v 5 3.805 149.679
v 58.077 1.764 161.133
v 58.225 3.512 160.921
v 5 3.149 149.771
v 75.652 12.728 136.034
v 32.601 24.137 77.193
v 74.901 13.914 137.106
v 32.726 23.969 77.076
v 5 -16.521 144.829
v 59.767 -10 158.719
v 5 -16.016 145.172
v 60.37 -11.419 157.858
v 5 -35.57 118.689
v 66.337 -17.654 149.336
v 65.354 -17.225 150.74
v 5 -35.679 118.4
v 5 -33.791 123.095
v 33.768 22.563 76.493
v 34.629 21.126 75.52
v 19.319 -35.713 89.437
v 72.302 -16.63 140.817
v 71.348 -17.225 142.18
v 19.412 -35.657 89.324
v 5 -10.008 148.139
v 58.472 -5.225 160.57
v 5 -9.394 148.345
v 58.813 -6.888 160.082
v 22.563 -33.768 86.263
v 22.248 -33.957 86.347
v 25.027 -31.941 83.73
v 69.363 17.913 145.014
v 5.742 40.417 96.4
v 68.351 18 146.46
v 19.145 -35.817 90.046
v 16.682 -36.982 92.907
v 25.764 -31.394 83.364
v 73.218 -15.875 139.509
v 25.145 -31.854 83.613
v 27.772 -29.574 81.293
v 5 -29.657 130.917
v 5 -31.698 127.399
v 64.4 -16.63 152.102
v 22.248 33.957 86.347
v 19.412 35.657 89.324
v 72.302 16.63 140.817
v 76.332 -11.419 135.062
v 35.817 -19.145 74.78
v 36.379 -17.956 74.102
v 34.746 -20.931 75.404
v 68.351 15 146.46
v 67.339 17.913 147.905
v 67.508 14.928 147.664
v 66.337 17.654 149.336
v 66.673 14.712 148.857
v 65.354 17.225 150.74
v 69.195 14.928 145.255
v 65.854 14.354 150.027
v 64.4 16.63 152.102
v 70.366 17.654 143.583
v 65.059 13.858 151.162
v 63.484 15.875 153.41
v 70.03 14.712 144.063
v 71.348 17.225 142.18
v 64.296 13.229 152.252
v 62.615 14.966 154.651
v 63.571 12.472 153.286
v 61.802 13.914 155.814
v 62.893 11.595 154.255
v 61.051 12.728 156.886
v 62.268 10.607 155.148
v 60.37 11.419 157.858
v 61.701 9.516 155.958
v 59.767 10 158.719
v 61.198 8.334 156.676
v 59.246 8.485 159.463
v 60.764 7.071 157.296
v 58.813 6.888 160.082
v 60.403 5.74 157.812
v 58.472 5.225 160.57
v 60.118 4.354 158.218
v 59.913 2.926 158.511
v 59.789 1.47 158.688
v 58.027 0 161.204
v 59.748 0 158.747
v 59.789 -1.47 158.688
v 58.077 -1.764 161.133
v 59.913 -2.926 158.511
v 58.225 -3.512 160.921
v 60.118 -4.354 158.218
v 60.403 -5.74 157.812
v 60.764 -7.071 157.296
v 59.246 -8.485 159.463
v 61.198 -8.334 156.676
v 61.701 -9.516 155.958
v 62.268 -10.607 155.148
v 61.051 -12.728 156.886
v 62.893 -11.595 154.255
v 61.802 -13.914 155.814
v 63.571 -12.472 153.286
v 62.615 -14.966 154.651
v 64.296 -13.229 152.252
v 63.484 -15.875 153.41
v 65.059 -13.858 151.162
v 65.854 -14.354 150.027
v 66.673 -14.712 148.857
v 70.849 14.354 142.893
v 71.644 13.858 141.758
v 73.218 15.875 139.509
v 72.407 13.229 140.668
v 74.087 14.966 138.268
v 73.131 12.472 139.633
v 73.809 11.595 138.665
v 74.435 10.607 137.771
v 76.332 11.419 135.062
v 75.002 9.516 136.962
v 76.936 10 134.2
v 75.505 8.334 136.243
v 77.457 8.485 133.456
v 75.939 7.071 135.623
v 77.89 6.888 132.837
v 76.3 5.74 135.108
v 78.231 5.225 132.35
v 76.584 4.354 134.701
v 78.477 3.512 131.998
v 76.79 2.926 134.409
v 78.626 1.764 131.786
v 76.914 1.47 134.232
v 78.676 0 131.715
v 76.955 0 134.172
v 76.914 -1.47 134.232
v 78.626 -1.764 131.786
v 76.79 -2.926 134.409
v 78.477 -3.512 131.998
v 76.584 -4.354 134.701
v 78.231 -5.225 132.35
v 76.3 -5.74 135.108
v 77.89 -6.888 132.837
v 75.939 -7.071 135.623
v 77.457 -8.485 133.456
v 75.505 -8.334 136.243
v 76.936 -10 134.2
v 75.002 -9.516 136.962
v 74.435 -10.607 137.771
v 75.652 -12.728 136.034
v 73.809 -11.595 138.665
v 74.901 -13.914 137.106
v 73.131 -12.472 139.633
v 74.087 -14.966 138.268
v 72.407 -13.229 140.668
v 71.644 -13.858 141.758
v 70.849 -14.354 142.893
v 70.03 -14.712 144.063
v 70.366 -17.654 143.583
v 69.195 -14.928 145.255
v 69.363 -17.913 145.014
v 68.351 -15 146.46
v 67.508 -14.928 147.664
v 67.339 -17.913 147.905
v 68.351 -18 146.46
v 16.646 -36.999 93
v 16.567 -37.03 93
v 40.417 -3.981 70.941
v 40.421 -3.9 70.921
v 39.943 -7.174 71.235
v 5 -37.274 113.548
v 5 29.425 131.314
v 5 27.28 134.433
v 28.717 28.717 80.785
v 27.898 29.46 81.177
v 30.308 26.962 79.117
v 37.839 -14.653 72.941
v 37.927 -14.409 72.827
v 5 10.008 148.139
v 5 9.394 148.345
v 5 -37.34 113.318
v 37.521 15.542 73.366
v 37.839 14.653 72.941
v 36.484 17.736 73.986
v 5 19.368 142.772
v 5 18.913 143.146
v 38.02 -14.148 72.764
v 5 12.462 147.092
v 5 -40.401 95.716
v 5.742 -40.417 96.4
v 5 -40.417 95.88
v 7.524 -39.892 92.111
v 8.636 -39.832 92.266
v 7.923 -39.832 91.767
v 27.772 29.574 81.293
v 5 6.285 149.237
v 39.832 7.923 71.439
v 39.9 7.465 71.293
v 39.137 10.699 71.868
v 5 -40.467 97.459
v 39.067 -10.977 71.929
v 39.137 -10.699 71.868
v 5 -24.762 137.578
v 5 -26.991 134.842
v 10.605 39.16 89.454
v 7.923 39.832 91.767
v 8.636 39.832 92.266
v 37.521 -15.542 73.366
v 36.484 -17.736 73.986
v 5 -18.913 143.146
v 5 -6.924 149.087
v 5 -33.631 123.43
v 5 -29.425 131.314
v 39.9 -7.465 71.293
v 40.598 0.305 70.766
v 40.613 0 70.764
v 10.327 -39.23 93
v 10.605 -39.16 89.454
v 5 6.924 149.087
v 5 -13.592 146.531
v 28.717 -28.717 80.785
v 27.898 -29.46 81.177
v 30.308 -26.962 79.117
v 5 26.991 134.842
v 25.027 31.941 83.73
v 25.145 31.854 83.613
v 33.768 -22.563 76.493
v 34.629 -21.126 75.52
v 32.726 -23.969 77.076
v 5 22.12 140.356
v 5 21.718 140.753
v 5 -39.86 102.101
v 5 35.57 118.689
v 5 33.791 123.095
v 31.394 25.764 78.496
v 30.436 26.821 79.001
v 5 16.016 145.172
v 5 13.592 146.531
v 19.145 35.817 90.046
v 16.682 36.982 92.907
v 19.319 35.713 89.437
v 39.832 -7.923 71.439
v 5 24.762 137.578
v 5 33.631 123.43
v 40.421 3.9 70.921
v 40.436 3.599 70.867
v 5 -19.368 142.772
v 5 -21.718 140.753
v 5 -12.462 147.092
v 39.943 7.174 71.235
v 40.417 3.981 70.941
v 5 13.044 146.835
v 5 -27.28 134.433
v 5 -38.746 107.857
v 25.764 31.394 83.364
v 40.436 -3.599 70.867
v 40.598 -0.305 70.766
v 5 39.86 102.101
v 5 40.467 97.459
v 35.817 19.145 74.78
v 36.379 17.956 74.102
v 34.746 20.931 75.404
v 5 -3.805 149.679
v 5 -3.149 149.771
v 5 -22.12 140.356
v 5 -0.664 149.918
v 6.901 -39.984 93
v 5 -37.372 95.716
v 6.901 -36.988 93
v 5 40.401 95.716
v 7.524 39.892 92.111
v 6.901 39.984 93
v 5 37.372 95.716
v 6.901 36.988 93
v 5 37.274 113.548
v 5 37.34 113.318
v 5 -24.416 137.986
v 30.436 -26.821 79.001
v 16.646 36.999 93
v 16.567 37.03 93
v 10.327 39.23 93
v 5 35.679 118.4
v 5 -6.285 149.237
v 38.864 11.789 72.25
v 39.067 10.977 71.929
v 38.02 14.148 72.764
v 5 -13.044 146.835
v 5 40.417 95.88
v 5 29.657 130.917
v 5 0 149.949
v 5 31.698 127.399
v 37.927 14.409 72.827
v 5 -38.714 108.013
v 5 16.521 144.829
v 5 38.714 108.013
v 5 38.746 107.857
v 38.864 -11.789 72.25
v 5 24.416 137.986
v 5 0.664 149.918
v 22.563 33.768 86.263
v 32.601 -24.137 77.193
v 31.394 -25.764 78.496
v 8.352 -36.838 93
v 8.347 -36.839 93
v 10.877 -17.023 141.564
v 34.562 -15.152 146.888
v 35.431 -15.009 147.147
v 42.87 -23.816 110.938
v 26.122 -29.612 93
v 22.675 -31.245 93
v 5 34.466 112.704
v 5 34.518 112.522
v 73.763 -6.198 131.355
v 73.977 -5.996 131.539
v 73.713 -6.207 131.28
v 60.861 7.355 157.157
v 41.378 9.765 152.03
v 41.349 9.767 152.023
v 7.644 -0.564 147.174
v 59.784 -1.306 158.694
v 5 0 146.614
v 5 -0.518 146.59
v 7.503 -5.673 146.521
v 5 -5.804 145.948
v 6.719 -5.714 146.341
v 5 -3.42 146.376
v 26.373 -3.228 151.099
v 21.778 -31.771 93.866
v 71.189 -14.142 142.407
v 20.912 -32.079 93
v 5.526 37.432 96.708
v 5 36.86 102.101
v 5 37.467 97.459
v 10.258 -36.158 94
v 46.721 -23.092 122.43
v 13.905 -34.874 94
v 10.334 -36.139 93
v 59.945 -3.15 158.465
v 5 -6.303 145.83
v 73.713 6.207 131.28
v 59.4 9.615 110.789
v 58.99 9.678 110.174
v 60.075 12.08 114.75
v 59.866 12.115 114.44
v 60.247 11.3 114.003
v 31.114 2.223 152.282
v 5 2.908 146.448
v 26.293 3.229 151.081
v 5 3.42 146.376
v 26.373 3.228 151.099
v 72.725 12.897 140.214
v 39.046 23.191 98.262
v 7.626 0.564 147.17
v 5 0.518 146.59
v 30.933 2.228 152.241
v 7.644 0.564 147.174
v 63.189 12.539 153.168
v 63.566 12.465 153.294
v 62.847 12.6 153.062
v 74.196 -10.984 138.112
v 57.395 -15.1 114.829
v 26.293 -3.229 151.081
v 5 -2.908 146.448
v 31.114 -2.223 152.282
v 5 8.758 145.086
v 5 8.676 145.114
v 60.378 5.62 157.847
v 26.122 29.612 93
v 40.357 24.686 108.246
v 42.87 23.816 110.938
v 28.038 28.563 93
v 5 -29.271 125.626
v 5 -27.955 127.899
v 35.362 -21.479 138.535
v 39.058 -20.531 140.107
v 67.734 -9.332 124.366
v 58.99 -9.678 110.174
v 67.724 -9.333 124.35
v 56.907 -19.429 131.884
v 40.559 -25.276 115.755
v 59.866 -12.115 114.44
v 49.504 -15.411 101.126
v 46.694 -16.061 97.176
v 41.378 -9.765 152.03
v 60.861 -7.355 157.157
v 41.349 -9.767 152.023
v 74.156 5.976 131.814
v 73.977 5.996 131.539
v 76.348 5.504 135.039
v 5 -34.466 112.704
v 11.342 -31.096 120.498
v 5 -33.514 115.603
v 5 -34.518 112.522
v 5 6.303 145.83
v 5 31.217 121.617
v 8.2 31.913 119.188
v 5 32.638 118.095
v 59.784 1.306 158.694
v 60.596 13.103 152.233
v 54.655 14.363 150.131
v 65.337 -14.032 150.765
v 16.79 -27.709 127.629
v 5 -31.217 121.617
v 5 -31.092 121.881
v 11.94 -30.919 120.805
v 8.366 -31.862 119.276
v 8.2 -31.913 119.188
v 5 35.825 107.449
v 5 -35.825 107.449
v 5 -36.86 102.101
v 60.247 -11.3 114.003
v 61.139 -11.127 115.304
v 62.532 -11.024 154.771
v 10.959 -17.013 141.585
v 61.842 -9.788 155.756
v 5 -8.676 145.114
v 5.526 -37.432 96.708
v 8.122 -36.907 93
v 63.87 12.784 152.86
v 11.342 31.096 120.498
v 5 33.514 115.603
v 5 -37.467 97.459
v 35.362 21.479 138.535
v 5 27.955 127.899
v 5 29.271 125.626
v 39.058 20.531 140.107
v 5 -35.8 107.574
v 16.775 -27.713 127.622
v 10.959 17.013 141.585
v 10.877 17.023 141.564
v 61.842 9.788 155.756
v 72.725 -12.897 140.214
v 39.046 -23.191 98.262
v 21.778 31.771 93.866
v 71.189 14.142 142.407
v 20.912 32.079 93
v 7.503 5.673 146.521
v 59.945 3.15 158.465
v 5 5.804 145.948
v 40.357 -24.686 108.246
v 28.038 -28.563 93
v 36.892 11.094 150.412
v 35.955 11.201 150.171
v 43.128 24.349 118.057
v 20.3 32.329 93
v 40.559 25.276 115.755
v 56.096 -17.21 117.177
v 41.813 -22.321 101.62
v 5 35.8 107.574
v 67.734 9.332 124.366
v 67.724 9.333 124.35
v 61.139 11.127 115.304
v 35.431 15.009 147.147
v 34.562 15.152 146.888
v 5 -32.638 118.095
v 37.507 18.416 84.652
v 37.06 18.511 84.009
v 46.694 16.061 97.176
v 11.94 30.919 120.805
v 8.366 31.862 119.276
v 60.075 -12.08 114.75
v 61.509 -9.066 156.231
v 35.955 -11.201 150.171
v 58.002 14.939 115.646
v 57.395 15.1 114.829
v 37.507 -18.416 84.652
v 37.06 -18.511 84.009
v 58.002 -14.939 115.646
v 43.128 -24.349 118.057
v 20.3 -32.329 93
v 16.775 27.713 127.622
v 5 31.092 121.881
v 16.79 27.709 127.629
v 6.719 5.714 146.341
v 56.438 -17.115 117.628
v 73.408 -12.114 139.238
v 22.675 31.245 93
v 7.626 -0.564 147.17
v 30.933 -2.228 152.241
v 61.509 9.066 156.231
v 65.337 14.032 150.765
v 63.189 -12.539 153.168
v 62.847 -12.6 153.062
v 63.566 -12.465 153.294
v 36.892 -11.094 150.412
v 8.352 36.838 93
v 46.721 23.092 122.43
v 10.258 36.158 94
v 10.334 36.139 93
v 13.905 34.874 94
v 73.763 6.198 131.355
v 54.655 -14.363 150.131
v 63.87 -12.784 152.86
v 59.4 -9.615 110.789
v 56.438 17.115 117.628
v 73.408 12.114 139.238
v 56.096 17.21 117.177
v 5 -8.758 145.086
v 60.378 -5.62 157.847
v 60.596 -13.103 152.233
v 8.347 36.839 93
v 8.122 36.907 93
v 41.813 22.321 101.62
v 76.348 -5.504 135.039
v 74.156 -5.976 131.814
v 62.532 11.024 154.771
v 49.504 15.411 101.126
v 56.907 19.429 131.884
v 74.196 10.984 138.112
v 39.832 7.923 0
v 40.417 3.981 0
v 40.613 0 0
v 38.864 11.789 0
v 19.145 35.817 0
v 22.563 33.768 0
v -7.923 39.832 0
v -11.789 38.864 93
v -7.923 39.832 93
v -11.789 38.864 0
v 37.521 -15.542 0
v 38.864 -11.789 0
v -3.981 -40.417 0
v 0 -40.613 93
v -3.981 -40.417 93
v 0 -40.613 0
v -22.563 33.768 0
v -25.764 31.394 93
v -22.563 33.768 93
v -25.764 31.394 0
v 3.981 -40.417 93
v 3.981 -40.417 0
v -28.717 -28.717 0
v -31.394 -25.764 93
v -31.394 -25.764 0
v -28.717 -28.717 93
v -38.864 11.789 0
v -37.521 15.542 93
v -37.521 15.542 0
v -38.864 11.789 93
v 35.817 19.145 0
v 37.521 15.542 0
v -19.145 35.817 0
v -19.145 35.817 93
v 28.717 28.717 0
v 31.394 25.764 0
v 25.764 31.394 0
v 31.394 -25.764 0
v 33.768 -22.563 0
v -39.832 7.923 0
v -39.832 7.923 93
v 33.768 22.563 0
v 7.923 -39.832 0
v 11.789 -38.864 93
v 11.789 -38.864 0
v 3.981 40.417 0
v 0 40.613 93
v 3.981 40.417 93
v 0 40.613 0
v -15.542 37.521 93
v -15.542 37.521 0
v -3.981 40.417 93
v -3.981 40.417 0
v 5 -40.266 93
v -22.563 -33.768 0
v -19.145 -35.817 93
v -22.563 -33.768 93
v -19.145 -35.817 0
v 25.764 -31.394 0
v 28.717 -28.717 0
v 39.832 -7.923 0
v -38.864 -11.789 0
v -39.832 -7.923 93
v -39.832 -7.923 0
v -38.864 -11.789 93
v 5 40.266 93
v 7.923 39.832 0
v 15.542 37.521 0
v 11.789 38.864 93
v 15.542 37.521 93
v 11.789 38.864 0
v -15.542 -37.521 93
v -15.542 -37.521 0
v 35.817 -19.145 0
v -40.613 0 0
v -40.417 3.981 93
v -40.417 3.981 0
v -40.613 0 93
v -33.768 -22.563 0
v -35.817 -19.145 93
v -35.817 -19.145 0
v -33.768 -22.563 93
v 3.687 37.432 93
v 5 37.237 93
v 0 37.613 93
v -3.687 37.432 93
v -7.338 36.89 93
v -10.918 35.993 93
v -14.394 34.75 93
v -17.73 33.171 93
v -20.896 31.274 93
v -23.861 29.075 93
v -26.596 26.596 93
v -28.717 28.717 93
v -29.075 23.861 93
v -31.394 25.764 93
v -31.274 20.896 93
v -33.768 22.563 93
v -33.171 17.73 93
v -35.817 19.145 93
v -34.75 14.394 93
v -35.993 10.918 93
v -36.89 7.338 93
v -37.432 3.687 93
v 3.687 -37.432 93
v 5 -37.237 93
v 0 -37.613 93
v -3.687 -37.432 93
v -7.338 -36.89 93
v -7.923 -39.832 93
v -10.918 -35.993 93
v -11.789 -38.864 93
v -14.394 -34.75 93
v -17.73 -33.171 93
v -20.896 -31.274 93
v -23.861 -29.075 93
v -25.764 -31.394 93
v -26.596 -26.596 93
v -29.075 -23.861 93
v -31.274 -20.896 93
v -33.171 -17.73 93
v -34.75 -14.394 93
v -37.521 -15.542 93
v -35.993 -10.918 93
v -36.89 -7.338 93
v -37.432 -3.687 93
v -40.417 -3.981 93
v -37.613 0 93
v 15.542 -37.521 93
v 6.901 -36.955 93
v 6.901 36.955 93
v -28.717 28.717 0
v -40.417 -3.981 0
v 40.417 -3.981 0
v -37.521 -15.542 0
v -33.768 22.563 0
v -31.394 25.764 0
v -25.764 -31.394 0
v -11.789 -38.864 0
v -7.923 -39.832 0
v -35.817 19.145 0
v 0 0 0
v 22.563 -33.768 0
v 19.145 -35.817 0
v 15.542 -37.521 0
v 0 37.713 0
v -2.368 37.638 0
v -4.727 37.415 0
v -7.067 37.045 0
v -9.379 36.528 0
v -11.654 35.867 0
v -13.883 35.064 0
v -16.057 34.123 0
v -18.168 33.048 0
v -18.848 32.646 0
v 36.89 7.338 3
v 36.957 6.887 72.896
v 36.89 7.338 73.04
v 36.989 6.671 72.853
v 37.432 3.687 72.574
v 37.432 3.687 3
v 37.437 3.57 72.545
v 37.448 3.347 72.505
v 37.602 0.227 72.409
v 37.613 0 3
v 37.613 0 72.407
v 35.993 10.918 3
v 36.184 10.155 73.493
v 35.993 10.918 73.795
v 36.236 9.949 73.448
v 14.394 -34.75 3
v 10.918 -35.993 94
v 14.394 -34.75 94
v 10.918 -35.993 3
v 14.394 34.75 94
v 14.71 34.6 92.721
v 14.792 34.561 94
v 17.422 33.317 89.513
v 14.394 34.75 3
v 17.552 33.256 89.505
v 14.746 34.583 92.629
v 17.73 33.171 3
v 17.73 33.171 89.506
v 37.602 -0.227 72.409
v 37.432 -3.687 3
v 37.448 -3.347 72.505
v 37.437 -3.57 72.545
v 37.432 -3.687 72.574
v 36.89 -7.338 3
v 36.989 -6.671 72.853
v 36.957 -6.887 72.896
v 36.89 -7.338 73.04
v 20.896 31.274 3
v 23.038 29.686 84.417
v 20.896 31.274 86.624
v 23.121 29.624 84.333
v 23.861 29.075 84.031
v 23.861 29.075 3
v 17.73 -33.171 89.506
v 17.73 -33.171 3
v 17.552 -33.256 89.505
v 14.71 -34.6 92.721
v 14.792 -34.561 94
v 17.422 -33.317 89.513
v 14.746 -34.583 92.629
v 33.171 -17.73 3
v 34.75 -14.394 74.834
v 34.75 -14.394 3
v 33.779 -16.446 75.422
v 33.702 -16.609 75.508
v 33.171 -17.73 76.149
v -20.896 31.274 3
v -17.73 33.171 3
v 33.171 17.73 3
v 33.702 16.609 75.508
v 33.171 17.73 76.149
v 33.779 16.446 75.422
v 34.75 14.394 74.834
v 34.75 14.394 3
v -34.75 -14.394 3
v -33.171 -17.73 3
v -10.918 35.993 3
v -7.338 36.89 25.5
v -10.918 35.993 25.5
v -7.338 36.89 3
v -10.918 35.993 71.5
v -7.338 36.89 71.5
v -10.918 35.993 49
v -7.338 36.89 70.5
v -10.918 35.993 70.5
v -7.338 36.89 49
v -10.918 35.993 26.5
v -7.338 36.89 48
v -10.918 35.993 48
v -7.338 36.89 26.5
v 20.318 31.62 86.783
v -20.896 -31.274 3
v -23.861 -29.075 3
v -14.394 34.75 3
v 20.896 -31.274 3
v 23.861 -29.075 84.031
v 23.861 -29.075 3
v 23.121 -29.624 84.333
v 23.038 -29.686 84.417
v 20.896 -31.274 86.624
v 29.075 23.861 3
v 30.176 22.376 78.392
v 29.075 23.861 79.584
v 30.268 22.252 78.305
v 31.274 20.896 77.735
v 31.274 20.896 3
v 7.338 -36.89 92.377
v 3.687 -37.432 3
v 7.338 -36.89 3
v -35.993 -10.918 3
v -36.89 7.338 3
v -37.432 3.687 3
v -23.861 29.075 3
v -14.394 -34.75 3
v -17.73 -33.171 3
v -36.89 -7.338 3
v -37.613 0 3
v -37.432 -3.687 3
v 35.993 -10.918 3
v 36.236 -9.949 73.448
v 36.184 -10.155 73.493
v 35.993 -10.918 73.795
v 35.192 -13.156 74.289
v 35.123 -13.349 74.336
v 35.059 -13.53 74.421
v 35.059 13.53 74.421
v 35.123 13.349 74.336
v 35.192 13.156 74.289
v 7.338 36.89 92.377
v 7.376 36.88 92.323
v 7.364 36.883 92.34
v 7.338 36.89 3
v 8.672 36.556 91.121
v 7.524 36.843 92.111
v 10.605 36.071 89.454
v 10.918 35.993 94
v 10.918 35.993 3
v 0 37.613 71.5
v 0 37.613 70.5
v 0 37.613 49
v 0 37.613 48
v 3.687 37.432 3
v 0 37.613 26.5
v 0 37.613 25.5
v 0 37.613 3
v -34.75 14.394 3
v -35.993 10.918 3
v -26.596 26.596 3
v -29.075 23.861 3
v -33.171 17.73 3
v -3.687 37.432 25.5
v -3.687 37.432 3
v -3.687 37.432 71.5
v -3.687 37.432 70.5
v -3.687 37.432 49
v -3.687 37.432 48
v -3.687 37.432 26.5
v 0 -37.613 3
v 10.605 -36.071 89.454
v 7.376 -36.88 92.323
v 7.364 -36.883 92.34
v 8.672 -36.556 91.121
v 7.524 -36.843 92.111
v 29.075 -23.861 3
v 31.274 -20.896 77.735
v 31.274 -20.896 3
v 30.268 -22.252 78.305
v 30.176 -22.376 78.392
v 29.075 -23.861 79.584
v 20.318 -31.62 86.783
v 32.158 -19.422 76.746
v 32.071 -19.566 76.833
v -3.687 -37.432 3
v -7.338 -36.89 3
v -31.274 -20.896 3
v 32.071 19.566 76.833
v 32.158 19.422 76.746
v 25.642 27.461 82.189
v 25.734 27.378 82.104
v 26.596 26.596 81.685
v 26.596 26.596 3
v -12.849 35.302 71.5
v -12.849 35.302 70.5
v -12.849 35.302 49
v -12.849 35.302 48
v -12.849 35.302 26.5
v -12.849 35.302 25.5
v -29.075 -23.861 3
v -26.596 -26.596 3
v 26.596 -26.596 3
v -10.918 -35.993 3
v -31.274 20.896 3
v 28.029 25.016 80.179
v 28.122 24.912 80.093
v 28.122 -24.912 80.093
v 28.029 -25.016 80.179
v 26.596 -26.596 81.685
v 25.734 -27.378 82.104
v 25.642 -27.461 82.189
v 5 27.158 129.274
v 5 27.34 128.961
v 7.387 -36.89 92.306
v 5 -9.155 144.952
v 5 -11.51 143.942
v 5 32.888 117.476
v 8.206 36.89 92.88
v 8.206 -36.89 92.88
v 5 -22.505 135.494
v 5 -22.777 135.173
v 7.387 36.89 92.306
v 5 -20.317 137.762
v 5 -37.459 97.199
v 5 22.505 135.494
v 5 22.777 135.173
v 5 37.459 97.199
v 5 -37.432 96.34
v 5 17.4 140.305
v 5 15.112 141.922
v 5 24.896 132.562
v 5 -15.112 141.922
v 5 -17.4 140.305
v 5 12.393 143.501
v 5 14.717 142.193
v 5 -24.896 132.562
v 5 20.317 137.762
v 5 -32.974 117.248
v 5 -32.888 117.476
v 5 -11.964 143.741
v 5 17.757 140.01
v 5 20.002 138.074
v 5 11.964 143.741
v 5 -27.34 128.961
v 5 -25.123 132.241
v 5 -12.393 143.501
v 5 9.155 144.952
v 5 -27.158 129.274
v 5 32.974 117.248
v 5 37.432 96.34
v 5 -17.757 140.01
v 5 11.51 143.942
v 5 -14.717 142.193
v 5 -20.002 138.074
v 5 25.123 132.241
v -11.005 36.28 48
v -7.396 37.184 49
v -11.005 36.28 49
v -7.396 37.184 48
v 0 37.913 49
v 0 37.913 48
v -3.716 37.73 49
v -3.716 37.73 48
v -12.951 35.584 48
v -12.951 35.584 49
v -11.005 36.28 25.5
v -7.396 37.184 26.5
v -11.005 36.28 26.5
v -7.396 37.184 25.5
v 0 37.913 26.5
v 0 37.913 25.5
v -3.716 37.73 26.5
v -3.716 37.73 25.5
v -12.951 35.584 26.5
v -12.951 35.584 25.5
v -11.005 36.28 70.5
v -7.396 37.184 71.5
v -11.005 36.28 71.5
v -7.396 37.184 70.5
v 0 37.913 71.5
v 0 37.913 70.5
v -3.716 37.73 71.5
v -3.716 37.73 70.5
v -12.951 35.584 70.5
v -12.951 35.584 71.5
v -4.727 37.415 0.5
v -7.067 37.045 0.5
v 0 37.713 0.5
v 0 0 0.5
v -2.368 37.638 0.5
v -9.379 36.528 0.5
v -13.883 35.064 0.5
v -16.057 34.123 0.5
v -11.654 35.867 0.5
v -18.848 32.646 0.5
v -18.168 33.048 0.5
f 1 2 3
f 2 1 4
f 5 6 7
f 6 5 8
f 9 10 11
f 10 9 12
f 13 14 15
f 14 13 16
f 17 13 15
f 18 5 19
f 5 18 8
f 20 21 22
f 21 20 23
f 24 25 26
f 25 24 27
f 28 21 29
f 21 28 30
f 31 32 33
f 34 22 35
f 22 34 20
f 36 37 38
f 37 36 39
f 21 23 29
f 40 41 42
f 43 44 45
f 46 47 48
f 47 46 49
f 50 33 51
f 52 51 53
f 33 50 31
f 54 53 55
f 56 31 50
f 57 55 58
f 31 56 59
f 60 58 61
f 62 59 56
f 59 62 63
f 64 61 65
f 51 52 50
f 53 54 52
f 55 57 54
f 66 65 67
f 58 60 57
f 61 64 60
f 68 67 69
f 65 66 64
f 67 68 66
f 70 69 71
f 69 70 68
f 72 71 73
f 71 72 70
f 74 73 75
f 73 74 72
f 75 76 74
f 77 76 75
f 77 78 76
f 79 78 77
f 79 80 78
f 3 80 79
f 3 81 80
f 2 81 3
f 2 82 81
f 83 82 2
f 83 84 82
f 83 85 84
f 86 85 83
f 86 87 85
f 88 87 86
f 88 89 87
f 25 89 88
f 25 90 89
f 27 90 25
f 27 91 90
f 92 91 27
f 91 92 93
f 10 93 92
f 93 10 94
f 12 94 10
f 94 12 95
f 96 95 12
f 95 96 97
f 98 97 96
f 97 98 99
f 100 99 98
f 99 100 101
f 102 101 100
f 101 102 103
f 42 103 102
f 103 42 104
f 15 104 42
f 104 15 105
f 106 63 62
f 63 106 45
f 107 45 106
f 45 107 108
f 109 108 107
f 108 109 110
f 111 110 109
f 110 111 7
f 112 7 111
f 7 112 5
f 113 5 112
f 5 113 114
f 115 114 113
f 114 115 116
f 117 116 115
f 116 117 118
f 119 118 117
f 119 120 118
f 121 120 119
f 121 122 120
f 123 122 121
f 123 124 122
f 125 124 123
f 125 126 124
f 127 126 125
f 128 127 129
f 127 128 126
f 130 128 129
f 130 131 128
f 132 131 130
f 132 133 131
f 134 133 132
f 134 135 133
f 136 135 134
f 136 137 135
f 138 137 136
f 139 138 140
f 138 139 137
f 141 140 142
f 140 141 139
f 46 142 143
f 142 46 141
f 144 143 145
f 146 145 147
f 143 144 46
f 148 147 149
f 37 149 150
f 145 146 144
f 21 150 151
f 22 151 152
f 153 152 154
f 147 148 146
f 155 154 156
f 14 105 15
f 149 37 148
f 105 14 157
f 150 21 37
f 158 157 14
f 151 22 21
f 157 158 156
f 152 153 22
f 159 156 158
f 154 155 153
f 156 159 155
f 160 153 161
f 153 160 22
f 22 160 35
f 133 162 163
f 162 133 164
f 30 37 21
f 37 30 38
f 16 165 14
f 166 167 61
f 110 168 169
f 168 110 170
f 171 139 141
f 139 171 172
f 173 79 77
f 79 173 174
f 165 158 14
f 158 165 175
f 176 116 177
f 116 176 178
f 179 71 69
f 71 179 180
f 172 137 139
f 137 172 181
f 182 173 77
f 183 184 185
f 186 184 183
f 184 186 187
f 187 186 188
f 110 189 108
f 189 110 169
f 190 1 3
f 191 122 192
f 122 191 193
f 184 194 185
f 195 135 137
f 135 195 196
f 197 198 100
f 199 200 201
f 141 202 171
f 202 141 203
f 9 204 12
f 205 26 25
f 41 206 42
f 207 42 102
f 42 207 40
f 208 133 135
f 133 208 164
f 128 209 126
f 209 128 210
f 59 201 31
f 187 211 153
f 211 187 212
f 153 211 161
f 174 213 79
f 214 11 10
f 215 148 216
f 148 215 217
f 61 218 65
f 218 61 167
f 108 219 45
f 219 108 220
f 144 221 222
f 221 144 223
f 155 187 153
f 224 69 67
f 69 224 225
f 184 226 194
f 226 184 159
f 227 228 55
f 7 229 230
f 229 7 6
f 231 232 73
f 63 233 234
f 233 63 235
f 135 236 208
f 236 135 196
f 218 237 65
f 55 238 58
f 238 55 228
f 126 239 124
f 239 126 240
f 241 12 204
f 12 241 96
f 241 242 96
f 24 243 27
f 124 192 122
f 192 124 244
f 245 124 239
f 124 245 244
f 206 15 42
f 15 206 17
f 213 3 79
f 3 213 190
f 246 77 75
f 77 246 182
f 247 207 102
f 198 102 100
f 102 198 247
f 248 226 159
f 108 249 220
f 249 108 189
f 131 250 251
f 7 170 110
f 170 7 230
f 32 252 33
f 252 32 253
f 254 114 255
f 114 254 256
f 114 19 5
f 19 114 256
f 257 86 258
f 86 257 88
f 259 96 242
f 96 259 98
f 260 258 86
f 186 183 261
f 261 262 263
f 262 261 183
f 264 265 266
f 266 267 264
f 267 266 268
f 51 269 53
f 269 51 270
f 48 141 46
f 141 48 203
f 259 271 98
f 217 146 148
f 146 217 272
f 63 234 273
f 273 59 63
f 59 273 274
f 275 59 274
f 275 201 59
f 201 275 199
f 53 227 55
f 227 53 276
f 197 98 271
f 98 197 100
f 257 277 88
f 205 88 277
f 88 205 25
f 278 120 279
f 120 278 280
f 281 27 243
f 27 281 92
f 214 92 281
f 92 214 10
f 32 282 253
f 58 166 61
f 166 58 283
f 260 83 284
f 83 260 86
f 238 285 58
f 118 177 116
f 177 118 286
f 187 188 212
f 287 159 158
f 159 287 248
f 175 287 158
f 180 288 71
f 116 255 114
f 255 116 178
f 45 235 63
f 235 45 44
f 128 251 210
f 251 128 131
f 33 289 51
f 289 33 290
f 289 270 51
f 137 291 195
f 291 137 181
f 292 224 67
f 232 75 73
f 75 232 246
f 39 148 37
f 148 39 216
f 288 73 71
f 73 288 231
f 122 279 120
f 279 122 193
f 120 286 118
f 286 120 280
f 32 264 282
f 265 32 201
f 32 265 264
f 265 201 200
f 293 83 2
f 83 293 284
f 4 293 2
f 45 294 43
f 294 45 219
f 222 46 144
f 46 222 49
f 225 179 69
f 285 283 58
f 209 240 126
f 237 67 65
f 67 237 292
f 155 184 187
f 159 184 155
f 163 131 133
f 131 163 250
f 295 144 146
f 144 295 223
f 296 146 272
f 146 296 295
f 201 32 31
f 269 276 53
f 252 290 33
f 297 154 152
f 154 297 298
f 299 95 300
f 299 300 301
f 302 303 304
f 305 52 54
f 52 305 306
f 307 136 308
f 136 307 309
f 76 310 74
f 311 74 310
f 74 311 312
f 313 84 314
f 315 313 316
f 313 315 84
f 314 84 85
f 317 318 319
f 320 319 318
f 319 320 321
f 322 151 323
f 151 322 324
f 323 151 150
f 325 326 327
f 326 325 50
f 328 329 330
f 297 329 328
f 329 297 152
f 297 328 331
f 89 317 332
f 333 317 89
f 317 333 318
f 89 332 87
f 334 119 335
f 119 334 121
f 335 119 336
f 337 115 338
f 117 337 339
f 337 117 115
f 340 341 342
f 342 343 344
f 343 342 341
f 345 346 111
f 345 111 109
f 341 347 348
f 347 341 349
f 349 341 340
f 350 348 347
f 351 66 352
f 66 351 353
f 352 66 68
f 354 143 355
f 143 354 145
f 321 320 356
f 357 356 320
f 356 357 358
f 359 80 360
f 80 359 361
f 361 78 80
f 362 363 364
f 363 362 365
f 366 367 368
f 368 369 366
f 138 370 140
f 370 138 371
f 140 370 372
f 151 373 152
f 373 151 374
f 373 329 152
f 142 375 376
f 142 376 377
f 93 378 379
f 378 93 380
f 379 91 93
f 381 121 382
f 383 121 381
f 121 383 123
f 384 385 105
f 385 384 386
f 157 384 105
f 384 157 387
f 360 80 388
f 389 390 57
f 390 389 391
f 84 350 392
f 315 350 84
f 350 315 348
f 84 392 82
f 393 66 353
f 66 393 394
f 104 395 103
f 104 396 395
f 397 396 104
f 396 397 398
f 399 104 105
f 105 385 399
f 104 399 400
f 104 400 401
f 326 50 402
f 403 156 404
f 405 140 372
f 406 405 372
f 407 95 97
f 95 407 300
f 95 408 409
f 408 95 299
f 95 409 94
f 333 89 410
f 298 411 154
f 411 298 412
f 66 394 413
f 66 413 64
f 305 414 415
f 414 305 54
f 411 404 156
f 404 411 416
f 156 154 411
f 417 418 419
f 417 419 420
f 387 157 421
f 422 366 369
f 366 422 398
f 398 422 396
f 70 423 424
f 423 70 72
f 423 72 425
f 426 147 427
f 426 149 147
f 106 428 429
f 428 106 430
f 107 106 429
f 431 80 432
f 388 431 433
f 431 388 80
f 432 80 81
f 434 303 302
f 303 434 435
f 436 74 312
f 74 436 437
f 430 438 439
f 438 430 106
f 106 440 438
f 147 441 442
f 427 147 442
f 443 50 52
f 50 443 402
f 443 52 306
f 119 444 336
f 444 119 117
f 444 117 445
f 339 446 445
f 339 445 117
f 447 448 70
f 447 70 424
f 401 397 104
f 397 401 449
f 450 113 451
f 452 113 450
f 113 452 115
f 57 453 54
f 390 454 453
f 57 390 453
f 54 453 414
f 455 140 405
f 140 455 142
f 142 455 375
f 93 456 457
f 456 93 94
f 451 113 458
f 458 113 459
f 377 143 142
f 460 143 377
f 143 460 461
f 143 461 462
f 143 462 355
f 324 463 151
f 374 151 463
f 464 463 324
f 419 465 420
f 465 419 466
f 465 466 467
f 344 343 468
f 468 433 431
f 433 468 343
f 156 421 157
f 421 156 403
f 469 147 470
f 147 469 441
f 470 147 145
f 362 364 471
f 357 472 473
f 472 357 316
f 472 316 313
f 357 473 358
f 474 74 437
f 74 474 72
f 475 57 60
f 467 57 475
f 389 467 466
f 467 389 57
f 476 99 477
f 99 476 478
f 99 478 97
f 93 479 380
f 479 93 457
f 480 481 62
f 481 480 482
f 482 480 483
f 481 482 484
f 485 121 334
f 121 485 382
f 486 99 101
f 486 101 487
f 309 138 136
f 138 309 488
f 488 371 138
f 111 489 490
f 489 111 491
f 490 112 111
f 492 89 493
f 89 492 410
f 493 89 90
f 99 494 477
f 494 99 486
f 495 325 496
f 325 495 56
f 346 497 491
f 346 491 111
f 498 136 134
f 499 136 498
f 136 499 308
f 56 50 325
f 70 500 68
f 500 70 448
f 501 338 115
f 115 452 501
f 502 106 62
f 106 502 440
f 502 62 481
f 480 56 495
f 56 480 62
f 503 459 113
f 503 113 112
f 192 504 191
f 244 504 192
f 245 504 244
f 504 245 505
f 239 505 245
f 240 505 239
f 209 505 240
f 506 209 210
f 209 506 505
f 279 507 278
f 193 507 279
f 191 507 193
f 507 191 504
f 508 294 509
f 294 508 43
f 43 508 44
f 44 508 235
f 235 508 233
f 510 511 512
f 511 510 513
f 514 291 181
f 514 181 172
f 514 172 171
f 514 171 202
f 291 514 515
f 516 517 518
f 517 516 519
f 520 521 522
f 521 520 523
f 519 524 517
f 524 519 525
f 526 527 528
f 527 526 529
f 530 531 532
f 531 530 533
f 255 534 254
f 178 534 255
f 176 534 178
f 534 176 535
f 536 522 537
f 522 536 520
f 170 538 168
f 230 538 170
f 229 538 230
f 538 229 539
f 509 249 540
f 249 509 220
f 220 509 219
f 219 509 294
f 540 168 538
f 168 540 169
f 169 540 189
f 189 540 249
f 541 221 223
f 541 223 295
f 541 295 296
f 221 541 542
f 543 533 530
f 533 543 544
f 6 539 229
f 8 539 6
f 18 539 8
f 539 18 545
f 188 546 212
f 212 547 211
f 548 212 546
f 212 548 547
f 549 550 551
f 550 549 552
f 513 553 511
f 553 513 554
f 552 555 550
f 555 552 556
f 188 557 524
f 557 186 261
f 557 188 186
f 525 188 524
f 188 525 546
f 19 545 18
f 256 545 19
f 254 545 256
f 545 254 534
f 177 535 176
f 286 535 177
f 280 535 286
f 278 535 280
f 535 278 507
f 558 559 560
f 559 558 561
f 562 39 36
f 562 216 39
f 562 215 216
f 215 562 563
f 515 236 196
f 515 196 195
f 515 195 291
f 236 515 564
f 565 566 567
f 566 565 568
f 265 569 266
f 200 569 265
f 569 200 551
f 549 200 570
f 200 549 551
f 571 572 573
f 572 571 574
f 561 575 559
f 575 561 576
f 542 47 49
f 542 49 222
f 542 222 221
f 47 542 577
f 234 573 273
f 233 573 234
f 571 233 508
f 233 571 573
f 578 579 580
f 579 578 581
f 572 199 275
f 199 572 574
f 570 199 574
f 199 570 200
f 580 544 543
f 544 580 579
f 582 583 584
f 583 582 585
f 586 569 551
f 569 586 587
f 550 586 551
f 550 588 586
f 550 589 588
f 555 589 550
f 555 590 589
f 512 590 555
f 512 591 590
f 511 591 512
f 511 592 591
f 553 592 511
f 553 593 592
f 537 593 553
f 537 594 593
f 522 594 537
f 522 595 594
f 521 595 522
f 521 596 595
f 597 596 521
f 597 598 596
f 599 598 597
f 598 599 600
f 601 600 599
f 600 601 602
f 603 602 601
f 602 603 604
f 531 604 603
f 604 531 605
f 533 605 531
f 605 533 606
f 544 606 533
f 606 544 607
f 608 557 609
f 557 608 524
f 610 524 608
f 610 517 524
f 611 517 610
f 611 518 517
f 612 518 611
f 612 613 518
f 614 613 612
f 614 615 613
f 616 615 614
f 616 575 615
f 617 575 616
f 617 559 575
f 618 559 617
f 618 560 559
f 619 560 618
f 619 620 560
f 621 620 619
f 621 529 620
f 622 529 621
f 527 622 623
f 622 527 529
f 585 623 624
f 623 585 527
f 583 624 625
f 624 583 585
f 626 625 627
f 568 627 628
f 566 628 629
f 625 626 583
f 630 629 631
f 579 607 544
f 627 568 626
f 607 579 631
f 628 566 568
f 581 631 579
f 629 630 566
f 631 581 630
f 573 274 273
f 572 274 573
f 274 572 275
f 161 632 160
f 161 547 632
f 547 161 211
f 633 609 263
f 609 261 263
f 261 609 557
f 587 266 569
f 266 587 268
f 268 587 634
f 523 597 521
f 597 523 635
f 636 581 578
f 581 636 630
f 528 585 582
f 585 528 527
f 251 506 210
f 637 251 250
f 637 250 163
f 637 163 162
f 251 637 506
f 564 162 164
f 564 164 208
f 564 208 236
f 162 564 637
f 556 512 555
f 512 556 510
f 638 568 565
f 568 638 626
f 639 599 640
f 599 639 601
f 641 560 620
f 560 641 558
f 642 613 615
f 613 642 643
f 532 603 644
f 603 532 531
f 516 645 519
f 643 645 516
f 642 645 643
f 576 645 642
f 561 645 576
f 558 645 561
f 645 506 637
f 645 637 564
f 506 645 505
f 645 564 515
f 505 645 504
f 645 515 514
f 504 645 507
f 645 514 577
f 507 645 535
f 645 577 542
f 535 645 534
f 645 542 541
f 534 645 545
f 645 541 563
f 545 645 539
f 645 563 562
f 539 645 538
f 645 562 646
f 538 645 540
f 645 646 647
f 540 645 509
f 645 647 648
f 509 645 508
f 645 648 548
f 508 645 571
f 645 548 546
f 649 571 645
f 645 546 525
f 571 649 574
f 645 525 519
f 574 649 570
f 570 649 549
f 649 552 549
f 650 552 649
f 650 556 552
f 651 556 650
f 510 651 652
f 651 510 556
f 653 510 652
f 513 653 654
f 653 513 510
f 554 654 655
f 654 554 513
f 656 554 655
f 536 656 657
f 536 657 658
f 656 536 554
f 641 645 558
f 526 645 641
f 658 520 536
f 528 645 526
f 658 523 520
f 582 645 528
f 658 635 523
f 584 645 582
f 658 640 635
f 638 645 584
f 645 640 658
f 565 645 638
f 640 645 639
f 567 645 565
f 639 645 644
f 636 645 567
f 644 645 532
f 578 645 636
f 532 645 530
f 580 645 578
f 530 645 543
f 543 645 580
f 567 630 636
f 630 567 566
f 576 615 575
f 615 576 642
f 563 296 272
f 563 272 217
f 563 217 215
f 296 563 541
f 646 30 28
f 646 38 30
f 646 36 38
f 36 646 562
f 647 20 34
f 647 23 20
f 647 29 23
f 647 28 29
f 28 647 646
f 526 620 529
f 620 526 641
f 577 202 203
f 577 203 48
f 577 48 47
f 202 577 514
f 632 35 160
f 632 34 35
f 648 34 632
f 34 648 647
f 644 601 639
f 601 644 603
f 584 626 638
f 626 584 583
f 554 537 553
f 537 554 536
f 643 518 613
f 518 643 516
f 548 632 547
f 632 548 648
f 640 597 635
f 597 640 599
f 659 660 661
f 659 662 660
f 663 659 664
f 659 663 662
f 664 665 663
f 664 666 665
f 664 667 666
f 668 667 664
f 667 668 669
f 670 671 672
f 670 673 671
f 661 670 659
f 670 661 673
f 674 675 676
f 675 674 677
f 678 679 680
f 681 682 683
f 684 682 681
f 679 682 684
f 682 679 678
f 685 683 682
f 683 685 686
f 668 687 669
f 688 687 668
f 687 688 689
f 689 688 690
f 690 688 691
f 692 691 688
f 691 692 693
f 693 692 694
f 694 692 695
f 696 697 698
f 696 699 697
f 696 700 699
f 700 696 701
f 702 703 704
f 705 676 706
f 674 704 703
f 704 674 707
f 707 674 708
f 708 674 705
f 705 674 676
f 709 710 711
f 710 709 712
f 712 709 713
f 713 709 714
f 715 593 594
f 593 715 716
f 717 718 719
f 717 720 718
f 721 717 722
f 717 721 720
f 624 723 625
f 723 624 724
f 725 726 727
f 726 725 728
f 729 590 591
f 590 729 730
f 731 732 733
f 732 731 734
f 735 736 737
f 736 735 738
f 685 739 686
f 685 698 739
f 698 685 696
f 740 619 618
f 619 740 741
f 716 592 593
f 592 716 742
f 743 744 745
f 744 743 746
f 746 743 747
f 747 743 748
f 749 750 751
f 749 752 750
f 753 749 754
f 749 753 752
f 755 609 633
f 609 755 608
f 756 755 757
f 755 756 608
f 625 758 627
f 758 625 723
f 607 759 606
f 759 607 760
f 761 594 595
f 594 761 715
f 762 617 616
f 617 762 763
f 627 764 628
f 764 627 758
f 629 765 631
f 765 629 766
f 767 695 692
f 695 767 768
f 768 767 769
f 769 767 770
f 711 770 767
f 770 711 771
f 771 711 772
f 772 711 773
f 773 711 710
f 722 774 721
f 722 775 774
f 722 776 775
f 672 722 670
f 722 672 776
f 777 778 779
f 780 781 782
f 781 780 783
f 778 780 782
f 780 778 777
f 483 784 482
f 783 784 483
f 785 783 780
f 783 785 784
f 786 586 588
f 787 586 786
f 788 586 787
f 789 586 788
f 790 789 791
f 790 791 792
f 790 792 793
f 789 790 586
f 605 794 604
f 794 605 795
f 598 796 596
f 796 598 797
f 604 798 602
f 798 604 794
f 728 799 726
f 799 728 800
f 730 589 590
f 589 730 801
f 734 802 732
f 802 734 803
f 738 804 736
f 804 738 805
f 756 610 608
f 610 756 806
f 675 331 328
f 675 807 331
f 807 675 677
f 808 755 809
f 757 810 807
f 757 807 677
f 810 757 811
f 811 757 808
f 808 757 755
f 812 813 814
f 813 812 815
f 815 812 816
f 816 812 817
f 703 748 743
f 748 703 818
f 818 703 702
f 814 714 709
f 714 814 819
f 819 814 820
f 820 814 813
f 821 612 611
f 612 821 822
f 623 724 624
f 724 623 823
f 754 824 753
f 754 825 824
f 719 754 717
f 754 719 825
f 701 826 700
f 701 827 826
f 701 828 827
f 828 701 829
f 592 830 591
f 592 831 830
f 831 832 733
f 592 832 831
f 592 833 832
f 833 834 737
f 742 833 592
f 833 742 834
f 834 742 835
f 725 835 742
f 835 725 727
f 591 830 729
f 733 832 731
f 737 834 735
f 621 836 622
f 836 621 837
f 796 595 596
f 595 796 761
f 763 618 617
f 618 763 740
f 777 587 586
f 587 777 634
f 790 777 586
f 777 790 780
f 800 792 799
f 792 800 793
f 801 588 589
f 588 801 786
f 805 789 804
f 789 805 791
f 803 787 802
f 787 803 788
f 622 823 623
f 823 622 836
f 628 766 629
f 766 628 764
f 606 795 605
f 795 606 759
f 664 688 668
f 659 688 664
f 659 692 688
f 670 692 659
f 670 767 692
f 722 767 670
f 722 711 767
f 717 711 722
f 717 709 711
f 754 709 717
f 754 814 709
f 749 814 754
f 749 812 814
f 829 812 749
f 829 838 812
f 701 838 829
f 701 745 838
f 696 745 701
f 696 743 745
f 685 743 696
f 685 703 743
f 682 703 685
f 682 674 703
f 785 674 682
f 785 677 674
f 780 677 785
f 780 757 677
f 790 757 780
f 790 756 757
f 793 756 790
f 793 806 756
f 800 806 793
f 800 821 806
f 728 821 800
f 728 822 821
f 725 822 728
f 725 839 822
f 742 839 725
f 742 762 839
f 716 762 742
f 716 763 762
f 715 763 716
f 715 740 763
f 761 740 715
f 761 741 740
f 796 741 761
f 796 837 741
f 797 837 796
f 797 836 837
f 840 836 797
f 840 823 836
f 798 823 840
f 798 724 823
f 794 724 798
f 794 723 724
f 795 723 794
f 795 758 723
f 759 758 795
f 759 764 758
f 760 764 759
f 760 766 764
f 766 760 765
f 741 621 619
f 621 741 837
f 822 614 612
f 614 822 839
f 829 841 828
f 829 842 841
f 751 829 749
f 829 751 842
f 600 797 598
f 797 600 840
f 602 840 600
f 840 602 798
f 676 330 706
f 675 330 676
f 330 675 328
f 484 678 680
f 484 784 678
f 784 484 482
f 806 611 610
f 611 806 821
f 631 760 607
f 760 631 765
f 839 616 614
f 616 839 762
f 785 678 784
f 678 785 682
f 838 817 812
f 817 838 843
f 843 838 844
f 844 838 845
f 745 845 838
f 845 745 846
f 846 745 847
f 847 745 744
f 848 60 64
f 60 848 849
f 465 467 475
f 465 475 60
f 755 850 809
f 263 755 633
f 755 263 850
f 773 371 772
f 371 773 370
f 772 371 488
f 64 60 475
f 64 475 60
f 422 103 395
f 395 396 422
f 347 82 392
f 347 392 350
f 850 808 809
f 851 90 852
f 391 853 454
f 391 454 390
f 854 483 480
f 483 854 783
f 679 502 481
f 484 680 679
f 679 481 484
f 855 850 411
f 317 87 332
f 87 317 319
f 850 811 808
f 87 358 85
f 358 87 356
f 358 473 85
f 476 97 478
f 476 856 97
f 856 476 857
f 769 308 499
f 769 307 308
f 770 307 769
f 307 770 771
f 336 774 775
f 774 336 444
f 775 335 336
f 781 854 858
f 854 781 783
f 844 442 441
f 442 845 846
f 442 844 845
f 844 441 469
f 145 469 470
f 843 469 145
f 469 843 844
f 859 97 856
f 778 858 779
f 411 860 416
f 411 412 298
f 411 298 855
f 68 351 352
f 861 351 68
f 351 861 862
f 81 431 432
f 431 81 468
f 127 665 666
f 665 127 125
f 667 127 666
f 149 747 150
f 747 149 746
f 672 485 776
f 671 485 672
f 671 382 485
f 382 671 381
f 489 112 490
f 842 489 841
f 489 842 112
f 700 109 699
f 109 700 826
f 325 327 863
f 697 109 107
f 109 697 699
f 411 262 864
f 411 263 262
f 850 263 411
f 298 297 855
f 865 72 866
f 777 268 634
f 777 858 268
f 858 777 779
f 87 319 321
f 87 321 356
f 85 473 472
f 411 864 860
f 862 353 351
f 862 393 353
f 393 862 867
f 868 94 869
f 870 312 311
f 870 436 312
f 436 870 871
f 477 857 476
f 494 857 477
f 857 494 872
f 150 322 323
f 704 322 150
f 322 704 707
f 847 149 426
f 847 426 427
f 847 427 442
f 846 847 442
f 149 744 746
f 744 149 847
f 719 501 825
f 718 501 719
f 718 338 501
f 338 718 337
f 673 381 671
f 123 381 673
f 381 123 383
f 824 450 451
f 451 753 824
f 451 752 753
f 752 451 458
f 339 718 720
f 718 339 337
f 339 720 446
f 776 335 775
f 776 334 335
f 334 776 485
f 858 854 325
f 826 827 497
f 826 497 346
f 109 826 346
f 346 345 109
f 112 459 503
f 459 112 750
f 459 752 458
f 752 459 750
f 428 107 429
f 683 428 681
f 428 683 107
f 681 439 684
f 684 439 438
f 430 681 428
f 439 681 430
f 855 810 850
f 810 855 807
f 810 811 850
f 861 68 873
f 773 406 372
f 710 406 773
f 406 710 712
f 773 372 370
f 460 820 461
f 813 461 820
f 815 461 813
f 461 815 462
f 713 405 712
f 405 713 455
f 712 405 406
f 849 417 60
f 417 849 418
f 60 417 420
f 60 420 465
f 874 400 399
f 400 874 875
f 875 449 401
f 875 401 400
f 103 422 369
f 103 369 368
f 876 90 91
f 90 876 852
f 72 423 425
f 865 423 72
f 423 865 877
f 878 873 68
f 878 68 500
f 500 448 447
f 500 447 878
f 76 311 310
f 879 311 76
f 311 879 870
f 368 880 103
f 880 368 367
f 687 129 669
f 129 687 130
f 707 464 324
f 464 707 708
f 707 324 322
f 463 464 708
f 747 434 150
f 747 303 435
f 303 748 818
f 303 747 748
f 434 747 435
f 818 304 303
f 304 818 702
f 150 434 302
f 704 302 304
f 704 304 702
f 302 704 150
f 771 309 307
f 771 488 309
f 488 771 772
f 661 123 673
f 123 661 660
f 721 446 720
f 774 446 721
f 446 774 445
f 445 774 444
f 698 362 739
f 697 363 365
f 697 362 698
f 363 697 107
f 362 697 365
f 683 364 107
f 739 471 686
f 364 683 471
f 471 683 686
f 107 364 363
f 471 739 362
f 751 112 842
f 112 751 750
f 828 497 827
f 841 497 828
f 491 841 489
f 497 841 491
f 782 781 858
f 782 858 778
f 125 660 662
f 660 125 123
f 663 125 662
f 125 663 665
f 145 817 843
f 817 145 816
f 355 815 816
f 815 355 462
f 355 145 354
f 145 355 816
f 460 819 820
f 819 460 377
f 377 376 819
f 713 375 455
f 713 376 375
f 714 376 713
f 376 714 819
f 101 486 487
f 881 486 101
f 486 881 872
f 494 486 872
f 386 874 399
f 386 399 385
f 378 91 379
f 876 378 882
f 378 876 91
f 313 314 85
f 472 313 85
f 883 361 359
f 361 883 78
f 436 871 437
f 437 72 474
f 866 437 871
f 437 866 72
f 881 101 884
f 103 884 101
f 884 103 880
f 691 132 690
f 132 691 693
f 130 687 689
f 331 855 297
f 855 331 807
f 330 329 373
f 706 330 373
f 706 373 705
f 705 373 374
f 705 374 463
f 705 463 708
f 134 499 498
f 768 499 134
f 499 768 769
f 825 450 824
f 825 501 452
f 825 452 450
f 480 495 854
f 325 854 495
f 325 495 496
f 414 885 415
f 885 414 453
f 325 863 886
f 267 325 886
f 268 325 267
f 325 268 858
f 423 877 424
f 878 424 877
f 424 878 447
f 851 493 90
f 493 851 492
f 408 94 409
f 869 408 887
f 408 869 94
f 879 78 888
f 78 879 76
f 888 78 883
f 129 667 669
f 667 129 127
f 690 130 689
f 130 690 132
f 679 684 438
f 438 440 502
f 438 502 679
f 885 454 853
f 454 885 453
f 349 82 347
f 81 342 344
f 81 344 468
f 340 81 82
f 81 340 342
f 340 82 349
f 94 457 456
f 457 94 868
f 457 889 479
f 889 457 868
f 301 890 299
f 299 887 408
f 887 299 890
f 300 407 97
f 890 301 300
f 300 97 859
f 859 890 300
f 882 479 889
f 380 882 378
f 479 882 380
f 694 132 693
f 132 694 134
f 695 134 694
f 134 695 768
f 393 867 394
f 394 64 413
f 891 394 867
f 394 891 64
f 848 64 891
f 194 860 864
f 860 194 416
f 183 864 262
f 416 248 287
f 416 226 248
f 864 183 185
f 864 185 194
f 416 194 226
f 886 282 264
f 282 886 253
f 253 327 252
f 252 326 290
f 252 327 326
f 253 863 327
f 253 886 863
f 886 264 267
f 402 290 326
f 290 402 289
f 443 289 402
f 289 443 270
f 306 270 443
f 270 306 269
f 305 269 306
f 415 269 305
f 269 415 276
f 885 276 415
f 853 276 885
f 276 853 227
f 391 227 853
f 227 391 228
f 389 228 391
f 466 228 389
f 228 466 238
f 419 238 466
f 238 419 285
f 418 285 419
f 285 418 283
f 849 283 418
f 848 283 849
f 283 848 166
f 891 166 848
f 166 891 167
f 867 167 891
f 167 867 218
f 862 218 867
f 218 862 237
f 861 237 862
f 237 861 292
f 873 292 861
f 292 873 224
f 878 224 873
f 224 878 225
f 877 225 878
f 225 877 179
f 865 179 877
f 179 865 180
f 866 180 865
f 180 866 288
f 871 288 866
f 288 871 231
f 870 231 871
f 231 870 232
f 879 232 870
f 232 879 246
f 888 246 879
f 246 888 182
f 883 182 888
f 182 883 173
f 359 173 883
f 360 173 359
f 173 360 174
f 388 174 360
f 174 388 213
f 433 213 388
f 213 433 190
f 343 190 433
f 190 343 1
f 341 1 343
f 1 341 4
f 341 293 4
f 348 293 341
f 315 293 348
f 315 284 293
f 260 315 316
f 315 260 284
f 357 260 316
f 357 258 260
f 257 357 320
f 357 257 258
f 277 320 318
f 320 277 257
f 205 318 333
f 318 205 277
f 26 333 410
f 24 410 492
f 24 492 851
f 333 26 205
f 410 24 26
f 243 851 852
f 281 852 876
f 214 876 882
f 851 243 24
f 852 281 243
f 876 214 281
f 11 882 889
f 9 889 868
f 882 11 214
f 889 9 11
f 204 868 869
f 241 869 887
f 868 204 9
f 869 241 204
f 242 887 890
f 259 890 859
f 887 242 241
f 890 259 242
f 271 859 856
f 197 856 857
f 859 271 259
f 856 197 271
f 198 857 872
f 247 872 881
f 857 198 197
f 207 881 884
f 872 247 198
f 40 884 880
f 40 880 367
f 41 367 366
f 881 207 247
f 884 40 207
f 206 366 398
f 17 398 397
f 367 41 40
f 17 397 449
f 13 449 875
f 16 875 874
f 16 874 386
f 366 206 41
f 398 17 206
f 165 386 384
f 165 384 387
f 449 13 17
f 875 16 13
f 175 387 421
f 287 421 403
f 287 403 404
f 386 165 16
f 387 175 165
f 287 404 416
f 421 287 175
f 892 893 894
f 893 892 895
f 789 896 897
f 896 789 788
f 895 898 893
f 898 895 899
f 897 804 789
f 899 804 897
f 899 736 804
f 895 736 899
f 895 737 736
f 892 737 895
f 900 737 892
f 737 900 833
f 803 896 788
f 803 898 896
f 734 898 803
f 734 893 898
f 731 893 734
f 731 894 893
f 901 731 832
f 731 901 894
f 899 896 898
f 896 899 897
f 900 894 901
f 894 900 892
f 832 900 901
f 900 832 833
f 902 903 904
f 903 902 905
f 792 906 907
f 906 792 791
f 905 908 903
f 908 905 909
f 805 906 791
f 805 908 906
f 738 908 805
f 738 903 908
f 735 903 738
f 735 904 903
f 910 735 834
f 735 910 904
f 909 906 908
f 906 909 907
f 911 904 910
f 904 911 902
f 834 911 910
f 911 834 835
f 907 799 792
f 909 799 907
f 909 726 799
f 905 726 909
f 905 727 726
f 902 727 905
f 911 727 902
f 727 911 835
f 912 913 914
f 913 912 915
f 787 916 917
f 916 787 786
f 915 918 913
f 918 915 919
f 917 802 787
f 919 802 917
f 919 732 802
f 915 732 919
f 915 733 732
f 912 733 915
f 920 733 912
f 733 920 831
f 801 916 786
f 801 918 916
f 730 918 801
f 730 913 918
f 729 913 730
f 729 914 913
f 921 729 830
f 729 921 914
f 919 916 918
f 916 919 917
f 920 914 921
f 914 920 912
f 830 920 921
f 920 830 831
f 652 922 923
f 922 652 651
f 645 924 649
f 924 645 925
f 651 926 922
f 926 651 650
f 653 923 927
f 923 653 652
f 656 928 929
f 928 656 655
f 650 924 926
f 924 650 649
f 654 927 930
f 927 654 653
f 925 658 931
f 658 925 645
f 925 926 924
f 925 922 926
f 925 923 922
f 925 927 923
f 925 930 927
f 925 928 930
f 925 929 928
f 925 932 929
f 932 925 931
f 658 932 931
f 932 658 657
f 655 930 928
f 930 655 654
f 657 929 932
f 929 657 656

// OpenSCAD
totalvolym = 400000;  // 4dl i mm³
//radie = 100;
hojd = 90;

//hojd = totalvolym / PI*radie*radie;
radie = sqrt(totalvolym/(PI*hojd));
echo(radie);

tratt_r = 30/2;
tratt_r_2 = radie;
tratt_h = 80;
wall = 3;

fn= 64;

difference() {
    union() {
        cylinder(r=radie+wall, h=hojd+wall, $fn=fn);
        translate([2,0,hojd+10]) rotate([0,55,0])  tratt();
    }
    translate([0,0,wall]) cylinder(r=radie, h=hojd+1, $fn=fn);
    translate([2,0,hojd+10]) rotate([0,55,0]) tratt_in(wall2=0);
    translate([-195,-100,hojd+wall]) cube(200);
    translate([0,0,wall+hojd/2])pie(radie+0.3, 20, 1, 90, $fn=fn); //2dl mark 4%
    translate([0,0,wall+hojd/4])pie(radie+0.3, 20, 1, 90, $fn=fn); //1dl mark 2%
    translate([0,0,wall+hojd/2+hojd/4])pie(radie+0.3, 20, 1, 90, $fn=fn); //3dl mark 6%
    
    pie(radie+0.1, 30, 0.5, 90,$fn=100);
}

module tratt_in(wall2=0) {
    hull() {
        scale([1.28, 1, 1]) cylinder(r=tratt_r_2+wall2, 1, $fn=fn);
        translate([0,0,tratt_h])cylinder(r=tratt_r+wall2, 1, $fn=fn);
    }
}
module tratt() {
    difference() {
        tratt_in(wall2=wall);
        tratt_in(wall2=0);
    }
}

//tratt();



// Andras moduler
module pie(radius, angle, height, spin=0) {
    // Negative angles shift direction of rotation
    clockwise = (angle < 0) ? true : false;
    // Support angles < 0 and > 360
    normalized_angle = abs((angle % 360 != 0) ? angle % 360 : angle % 360 + 360);
    // Select rotation direction
    rotation = clockwise ? [0, 180 - normalized_angle] : [180, normalized_angle];
    // Render
    if (angle != 0) {
        rotate([0,0,spin]) linear_extrude(height=height)
            difference() {
                circle(radius);
                if (normalized_angle < 180) {
                    union() for(a = rotation)
                        rotate(a) translate([-radius, 0, 0]) square(radius * 2);
                }
                else if (normalized_angle != 360) {
                    intersection_for(a = rotation)
                        rotate(a) translate([-radius, 0, 0]) square(radius * 2);
                }
            }
    }
}
